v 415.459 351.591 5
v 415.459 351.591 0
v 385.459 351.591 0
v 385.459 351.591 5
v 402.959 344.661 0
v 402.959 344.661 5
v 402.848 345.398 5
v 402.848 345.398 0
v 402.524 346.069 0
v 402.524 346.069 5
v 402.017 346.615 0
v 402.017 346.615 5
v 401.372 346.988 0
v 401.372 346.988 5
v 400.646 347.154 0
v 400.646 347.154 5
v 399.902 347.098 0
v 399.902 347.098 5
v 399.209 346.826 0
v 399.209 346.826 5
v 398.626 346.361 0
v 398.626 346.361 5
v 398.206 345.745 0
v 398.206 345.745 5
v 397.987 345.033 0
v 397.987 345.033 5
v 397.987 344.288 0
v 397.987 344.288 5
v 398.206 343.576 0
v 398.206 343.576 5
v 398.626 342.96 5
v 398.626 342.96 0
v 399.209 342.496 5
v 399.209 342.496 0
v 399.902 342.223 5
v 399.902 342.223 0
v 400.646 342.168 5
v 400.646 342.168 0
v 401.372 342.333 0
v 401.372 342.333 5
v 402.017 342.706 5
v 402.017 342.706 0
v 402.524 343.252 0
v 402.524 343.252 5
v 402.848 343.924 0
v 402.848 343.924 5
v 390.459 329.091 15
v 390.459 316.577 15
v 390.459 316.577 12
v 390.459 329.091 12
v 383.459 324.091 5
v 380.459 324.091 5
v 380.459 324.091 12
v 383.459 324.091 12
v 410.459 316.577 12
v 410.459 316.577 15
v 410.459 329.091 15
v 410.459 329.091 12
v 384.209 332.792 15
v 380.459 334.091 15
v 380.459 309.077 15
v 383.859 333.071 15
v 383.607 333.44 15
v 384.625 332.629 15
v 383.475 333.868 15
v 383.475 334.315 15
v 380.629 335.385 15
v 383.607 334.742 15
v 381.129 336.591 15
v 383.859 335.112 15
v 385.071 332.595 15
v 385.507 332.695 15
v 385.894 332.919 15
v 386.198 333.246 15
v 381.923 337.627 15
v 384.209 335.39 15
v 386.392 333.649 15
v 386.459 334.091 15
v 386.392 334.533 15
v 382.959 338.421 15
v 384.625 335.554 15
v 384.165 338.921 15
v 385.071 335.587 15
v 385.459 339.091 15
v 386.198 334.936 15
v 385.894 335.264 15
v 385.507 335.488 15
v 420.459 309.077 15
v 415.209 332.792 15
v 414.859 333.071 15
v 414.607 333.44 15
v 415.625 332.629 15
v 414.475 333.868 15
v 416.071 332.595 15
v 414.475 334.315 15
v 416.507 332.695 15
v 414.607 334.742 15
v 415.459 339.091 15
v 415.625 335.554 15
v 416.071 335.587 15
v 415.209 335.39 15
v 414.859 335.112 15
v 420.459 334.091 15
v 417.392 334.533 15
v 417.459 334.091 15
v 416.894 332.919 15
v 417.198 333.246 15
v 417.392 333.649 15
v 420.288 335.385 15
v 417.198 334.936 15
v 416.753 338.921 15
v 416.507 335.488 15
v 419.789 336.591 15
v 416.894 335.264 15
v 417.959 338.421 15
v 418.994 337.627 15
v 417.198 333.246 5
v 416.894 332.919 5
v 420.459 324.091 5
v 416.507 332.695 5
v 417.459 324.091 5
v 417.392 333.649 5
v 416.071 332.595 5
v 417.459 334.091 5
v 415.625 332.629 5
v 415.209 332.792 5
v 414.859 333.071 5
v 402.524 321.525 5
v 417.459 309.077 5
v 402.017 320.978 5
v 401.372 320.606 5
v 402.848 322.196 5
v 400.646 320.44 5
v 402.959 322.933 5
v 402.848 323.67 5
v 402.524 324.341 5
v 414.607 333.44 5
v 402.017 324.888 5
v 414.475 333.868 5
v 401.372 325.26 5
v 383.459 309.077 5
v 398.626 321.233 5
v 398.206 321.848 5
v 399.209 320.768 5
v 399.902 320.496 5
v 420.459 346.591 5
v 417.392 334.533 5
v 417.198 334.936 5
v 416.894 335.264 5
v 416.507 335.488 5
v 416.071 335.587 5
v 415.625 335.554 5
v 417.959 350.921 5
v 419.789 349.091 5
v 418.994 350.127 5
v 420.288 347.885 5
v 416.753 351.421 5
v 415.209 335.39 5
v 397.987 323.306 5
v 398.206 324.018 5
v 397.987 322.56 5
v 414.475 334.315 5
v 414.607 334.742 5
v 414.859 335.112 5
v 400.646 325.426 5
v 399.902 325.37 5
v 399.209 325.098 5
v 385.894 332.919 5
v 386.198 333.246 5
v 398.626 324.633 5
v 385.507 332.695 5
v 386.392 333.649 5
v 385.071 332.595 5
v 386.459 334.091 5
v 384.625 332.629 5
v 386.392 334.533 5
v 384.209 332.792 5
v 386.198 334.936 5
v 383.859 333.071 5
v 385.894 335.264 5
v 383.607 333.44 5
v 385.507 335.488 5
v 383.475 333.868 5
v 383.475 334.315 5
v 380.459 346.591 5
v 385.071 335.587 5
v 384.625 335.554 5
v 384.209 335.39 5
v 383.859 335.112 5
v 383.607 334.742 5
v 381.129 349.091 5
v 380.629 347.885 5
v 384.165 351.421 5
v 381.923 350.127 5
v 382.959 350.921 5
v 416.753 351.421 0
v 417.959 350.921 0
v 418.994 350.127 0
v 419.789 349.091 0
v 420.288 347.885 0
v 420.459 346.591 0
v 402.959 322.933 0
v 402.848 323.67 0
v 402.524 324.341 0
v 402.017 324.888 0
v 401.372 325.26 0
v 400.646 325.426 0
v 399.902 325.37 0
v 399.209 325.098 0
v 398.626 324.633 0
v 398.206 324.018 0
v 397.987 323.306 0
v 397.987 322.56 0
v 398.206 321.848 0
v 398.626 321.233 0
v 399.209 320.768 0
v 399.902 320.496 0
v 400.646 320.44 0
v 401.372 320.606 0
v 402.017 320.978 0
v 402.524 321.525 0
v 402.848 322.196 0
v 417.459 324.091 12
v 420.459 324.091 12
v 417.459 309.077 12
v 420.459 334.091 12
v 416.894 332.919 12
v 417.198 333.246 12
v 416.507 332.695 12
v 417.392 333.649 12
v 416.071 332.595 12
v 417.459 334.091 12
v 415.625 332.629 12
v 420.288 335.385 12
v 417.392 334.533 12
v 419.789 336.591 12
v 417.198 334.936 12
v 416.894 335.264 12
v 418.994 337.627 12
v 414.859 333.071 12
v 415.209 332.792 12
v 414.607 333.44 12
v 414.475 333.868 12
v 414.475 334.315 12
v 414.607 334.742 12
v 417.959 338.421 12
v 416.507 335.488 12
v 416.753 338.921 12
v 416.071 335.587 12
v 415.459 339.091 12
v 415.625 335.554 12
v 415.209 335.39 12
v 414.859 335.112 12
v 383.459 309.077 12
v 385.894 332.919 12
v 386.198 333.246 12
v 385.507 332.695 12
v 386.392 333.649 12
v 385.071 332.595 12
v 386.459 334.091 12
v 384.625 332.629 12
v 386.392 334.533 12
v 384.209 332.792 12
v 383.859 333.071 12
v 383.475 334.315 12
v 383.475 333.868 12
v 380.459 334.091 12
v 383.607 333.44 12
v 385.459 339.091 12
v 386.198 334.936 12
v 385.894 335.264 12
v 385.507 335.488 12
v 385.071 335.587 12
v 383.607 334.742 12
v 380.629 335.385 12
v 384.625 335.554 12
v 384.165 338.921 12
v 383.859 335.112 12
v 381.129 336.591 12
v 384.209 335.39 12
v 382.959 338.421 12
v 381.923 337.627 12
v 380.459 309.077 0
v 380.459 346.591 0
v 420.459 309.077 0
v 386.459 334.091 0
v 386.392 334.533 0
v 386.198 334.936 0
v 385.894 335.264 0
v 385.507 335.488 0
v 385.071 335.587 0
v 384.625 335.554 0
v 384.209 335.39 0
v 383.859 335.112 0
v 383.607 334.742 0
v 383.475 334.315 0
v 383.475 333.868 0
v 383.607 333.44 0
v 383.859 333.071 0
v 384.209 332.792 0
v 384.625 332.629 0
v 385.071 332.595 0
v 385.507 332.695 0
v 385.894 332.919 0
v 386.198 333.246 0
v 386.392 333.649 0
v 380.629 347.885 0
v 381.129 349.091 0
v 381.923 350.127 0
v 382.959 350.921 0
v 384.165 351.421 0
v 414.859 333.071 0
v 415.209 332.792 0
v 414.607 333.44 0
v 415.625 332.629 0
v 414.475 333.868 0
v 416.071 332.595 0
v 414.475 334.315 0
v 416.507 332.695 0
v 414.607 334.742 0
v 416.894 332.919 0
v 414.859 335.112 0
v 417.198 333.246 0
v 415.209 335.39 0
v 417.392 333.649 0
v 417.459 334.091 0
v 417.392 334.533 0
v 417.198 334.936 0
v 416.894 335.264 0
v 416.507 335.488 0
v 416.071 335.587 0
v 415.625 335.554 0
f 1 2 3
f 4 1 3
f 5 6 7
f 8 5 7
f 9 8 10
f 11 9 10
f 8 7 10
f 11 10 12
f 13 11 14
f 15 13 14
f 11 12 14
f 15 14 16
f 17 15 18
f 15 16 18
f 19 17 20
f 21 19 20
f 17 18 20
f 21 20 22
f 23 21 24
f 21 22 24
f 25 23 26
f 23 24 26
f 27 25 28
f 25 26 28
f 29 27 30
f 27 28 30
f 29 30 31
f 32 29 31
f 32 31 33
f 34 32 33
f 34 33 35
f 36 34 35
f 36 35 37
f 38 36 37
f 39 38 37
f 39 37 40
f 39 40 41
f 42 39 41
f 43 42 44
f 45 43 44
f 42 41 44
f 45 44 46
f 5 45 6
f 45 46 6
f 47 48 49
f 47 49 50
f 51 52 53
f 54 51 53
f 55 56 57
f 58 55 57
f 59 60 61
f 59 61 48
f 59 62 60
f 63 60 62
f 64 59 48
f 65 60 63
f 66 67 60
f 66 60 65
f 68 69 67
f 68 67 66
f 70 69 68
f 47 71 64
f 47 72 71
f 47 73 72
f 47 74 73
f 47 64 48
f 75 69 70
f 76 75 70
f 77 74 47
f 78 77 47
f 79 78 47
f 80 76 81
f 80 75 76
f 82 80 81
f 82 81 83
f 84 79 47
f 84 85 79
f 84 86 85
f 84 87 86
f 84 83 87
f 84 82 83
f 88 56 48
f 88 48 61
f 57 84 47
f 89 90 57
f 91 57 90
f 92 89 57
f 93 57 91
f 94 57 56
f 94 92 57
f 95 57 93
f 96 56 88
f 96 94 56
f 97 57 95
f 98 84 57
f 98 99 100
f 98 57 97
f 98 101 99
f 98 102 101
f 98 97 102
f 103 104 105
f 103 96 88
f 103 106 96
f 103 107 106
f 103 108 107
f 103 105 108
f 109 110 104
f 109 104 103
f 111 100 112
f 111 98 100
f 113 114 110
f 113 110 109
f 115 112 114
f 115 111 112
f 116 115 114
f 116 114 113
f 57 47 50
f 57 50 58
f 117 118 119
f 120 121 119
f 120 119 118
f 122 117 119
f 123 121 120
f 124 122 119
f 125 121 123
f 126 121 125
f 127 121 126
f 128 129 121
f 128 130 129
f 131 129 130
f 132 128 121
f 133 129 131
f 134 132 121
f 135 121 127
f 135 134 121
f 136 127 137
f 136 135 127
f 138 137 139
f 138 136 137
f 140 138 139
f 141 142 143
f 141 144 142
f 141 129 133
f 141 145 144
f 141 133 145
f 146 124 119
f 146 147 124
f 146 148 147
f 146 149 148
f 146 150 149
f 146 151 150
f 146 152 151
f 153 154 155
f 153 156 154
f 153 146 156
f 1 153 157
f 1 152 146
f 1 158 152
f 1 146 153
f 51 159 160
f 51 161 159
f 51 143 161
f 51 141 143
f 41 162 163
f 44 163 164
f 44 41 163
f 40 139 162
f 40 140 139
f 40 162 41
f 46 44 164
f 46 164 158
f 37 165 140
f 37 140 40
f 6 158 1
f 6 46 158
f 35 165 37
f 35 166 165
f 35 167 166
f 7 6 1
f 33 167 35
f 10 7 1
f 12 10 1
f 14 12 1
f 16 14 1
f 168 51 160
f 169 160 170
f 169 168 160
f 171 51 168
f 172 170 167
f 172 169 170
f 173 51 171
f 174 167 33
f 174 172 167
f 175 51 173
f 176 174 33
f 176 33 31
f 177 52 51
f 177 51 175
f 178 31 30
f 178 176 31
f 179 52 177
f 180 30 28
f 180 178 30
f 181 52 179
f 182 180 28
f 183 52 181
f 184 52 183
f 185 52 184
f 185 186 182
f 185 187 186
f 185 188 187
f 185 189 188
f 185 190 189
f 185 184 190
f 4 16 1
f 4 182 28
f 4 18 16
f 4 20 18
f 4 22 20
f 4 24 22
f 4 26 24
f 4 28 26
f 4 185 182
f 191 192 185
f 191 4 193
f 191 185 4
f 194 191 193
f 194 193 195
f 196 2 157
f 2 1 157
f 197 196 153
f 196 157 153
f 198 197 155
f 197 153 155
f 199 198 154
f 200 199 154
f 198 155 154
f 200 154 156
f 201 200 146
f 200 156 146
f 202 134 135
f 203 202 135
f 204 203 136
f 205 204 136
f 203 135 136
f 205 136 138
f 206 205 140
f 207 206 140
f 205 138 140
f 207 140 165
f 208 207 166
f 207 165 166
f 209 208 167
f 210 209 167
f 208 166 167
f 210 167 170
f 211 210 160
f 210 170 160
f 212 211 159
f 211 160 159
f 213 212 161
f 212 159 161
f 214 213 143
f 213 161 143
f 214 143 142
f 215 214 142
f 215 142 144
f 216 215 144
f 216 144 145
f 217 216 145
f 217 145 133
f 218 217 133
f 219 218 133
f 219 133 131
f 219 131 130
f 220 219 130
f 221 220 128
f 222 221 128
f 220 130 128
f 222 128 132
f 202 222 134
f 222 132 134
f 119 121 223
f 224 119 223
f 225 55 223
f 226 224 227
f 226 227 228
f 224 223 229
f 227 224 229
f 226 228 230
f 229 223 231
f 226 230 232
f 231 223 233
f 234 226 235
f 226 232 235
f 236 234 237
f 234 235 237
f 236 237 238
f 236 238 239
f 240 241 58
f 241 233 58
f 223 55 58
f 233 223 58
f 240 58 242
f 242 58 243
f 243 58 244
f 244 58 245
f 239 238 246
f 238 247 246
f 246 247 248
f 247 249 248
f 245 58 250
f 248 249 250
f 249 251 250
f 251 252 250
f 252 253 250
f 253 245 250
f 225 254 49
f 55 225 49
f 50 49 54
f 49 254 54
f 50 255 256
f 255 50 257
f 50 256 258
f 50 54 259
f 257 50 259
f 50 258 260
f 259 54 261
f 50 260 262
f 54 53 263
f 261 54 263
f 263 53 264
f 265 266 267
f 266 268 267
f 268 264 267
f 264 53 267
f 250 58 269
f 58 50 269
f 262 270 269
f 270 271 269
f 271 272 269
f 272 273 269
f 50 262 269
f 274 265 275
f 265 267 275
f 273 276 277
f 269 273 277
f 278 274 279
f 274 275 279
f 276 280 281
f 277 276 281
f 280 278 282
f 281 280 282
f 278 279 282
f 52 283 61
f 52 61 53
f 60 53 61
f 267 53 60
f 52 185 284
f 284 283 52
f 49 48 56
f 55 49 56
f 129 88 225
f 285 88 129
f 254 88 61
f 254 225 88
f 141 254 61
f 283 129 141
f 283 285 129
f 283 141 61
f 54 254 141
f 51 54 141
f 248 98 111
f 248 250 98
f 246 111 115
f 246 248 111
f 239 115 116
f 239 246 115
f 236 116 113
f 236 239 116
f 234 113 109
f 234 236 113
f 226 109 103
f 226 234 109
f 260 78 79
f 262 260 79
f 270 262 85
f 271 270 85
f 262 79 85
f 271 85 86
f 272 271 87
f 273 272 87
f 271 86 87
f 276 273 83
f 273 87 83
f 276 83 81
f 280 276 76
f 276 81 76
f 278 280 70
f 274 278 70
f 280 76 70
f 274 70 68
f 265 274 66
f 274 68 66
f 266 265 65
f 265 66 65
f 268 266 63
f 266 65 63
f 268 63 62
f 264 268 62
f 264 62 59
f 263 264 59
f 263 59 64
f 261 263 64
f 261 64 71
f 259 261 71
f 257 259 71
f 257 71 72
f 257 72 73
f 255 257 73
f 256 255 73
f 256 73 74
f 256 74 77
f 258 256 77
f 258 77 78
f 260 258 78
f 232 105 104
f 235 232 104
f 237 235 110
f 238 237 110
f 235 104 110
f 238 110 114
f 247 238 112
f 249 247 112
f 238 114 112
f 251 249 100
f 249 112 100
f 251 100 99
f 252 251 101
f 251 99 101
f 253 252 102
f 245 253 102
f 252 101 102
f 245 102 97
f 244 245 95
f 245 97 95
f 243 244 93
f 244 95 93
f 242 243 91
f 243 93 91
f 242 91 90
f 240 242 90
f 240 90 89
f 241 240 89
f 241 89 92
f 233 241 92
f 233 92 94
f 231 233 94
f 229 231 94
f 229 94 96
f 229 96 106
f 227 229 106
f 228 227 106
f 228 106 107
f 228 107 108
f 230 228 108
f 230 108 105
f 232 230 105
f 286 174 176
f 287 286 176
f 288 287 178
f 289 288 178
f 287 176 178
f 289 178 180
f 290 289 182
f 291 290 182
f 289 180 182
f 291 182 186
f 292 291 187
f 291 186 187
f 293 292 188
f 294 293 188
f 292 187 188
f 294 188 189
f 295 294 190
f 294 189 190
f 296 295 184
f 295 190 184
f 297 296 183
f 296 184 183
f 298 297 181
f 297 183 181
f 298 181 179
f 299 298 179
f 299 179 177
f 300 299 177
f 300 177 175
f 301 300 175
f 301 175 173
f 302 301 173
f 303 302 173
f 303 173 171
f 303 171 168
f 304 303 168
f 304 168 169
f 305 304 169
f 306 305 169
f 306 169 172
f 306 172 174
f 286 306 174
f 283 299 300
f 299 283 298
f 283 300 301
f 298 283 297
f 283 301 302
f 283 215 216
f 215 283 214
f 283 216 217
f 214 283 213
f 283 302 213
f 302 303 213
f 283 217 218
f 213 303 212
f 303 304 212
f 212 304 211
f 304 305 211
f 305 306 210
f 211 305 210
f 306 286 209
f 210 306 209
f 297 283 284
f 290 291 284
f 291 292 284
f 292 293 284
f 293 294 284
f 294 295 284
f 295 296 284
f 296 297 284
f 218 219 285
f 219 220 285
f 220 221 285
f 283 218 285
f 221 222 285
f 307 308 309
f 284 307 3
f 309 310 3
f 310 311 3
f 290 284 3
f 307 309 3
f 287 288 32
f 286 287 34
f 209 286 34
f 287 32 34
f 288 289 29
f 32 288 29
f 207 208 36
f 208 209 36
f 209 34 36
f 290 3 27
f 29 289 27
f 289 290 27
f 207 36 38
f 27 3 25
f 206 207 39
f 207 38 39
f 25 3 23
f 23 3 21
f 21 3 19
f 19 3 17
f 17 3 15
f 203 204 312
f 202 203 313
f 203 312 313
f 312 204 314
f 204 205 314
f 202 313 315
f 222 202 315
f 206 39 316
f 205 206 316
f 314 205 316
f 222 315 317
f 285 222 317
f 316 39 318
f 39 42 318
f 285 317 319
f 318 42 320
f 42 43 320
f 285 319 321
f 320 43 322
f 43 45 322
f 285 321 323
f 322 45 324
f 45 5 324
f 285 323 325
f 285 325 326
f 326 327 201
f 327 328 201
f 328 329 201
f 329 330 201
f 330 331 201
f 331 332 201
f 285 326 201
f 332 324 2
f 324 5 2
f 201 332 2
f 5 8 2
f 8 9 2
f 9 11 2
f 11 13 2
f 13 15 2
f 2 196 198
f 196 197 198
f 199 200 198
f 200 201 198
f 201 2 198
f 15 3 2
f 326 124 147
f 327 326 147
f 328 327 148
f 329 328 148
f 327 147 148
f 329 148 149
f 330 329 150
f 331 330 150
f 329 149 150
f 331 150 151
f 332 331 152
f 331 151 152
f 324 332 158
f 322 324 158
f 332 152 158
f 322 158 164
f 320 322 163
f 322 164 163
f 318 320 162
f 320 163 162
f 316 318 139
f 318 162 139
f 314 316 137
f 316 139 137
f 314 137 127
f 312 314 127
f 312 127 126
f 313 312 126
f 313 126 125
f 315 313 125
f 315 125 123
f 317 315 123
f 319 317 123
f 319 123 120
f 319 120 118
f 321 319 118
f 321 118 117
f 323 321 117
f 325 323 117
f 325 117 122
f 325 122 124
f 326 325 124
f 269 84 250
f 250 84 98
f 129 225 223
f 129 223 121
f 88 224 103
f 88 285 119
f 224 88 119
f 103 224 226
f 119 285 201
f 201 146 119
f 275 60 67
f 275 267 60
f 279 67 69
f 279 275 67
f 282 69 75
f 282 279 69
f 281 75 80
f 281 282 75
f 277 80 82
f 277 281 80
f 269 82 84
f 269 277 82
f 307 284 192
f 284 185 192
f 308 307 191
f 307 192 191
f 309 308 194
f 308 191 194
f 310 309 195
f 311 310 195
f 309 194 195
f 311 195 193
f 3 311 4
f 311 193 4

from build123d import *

# Parameters (mm, degrees)
SKETCH1_W           = 40
SKETCH1_H           = 50
BOSS_EXTRUDE2_DEPTH = 15
SKETCH2_W           = 34
SKETCH2_H           = 7
CUT_EXTRUDE1_DEPTH  = 50
SKETCH3_W           = 7
SKETCH3_H           = 30
CUT_EXTRUDE2_DEPTH  = 50
SKETCH6_W           = 40
SKETCH6_H           = 2.5
SKETCH6_H_2         = 4.98530806
CUT_EXTRUDE4_DEPTH  = 50
SKETCH7_W           = 40
SKETCH7_H           = 12.5
CUT_EXTRUDE5_DEPTH  = 5
SKETCH8_W           = 20
SKETCH8_H           = 12.51469194
CUT_EXTRUDE7_DEPTH  = 5
SKETCH11_R          = 2.5
CUT_EXTRUDE10_DEPTH = 5
SKETCH12_R          = 1.5
CUT_EXTRUDE11_DEPTH = 15
FILLET2_R           = 5
FILLET3_R           = 5


with BuildPart() as part:
    # Sketch1 → Boss-Extrude2 (new body)
    with BuildSketch(Plane.XY):
        with Locations((400.458722726, 329.091279026)):
            Rectangle(SKETCH1_W, SKETCH1_H)
    extrude(amount=BOSS_EXTRUDE2_DEPTH)

    # Sketch2 → Cut-Extrude1 (cut)
    with BuildSketch(Plane(origin=(0, 354.091279026, 0), x_dir=(1, 0, 0), z_dir=(0, 1, 0))):
        with Locations((400.458722726, -8.5)):
            Rectangle(SKETCH2_W, SKETCH2_H)
    extrude(amount=-CUT_EXTRUDE1_DEPTH, mode=Mode.SUBTRACT)

    # Sketch3 → Cut-Extrude2 (cut)
    with BuildSketch(Plane.ZY.offset(-380.458722726)):
        with Locations((8.5, 339.091279026)):
            Rectangle(SKETCH3_W, SKETCH3_H)
    extrude(amount=-CUT_EXTRUDE2_DEPTH, mode=Mode.SUBTRACT)

    # Sketch6 → Cut-Extrude4 (cut)
    with BuildSketch(Plane(origin=(0, 0, 0), x_dir=(-1, 0, 0), z_dir=(0, 0, -1))):
        with Locations((-400.458722726, 352.841279026)):
            Rectangle(SKETCH6_W, SKETCH6_H)
        with Locations((-400.458722726, 306.583933056)):
            Rectangle(SKETCH6_W, SKETCH6_H_2)
    extrude(amount=-CUT_EXTRUDE4_DEPTH, mode=Mode.SUBTRACT)

    # Sketch7 → Cut-Extrude5 (cut)
    with BuildSketch(Plane.XY.offset(15)):
        with Locations((400.458722726, 345.341279026)):
            Rectangle(SKETCH7_W, SKETCH7_H)
    extrude(amount=-CUT_EXTRUDE5_DEPTH, mode=Mode.SUBTRACT)

    # Sketch8 → Cut-Extrude7 (cut)
    with BuildSketch(Plane.XY.offset(15)):
        with Locations((400.458722726, 322.833933056)):
            Rectangle(SKETCH8_W, SKETCH8_H)
    extrude(amount=-CUT_EXTRUDE7_DEPTH, mode=Mode.SUBTRACT)

    # Sketch11 → Cut-Extrude10 (cut)
    with BuildSketch(Plane.XY.offset(5)):
        with Locations((400.458722726, 344.660615353)):
            Circle(SKETCH11_R)
        with Locations((400.458722726, 322.932953385)):
            Circle(SKETCH11_R)
    extrude(amount=-CUT_EXTRUDE10_DEPTH, mode=Mode.SUBTRACT)

    # Sketch12 → Cut-Extrude11 (cut)
    with BuildSketch(Plane.XY.offset(15)):
        with Locations((415.958722726, 334.091279026)):
            Circle(SKETCH12_R)
        with Locations((384.958722726, 334.091279026)):
            Circle(SKETCH12_R)
    extrude(amount=-CUT_EXTRUDE11_DEPTH, mode=Mode.SUBTRACT)

    # Fillet2
    fillet2_edges = [part.edges().sort_by_distance(p)[0] for p in [
        (380.458722726, 339.091279026, 13.5),
    ]]
    fillet(fillet2_edges, radius=FILLET2_R)

    # Fillet3
    fillet3_edges = [part.edges().sort_by_distance(p)[0] for p in [
        (420.458722726, 339.091279026, 13.5),
        (380.458722726, 351.591279026, 2.5),
        (420.458722726, 351.591279026, 2.5),
    ]]
    fillet(fillet3_edges, radius=FILLET3_R)


solid = part.part
